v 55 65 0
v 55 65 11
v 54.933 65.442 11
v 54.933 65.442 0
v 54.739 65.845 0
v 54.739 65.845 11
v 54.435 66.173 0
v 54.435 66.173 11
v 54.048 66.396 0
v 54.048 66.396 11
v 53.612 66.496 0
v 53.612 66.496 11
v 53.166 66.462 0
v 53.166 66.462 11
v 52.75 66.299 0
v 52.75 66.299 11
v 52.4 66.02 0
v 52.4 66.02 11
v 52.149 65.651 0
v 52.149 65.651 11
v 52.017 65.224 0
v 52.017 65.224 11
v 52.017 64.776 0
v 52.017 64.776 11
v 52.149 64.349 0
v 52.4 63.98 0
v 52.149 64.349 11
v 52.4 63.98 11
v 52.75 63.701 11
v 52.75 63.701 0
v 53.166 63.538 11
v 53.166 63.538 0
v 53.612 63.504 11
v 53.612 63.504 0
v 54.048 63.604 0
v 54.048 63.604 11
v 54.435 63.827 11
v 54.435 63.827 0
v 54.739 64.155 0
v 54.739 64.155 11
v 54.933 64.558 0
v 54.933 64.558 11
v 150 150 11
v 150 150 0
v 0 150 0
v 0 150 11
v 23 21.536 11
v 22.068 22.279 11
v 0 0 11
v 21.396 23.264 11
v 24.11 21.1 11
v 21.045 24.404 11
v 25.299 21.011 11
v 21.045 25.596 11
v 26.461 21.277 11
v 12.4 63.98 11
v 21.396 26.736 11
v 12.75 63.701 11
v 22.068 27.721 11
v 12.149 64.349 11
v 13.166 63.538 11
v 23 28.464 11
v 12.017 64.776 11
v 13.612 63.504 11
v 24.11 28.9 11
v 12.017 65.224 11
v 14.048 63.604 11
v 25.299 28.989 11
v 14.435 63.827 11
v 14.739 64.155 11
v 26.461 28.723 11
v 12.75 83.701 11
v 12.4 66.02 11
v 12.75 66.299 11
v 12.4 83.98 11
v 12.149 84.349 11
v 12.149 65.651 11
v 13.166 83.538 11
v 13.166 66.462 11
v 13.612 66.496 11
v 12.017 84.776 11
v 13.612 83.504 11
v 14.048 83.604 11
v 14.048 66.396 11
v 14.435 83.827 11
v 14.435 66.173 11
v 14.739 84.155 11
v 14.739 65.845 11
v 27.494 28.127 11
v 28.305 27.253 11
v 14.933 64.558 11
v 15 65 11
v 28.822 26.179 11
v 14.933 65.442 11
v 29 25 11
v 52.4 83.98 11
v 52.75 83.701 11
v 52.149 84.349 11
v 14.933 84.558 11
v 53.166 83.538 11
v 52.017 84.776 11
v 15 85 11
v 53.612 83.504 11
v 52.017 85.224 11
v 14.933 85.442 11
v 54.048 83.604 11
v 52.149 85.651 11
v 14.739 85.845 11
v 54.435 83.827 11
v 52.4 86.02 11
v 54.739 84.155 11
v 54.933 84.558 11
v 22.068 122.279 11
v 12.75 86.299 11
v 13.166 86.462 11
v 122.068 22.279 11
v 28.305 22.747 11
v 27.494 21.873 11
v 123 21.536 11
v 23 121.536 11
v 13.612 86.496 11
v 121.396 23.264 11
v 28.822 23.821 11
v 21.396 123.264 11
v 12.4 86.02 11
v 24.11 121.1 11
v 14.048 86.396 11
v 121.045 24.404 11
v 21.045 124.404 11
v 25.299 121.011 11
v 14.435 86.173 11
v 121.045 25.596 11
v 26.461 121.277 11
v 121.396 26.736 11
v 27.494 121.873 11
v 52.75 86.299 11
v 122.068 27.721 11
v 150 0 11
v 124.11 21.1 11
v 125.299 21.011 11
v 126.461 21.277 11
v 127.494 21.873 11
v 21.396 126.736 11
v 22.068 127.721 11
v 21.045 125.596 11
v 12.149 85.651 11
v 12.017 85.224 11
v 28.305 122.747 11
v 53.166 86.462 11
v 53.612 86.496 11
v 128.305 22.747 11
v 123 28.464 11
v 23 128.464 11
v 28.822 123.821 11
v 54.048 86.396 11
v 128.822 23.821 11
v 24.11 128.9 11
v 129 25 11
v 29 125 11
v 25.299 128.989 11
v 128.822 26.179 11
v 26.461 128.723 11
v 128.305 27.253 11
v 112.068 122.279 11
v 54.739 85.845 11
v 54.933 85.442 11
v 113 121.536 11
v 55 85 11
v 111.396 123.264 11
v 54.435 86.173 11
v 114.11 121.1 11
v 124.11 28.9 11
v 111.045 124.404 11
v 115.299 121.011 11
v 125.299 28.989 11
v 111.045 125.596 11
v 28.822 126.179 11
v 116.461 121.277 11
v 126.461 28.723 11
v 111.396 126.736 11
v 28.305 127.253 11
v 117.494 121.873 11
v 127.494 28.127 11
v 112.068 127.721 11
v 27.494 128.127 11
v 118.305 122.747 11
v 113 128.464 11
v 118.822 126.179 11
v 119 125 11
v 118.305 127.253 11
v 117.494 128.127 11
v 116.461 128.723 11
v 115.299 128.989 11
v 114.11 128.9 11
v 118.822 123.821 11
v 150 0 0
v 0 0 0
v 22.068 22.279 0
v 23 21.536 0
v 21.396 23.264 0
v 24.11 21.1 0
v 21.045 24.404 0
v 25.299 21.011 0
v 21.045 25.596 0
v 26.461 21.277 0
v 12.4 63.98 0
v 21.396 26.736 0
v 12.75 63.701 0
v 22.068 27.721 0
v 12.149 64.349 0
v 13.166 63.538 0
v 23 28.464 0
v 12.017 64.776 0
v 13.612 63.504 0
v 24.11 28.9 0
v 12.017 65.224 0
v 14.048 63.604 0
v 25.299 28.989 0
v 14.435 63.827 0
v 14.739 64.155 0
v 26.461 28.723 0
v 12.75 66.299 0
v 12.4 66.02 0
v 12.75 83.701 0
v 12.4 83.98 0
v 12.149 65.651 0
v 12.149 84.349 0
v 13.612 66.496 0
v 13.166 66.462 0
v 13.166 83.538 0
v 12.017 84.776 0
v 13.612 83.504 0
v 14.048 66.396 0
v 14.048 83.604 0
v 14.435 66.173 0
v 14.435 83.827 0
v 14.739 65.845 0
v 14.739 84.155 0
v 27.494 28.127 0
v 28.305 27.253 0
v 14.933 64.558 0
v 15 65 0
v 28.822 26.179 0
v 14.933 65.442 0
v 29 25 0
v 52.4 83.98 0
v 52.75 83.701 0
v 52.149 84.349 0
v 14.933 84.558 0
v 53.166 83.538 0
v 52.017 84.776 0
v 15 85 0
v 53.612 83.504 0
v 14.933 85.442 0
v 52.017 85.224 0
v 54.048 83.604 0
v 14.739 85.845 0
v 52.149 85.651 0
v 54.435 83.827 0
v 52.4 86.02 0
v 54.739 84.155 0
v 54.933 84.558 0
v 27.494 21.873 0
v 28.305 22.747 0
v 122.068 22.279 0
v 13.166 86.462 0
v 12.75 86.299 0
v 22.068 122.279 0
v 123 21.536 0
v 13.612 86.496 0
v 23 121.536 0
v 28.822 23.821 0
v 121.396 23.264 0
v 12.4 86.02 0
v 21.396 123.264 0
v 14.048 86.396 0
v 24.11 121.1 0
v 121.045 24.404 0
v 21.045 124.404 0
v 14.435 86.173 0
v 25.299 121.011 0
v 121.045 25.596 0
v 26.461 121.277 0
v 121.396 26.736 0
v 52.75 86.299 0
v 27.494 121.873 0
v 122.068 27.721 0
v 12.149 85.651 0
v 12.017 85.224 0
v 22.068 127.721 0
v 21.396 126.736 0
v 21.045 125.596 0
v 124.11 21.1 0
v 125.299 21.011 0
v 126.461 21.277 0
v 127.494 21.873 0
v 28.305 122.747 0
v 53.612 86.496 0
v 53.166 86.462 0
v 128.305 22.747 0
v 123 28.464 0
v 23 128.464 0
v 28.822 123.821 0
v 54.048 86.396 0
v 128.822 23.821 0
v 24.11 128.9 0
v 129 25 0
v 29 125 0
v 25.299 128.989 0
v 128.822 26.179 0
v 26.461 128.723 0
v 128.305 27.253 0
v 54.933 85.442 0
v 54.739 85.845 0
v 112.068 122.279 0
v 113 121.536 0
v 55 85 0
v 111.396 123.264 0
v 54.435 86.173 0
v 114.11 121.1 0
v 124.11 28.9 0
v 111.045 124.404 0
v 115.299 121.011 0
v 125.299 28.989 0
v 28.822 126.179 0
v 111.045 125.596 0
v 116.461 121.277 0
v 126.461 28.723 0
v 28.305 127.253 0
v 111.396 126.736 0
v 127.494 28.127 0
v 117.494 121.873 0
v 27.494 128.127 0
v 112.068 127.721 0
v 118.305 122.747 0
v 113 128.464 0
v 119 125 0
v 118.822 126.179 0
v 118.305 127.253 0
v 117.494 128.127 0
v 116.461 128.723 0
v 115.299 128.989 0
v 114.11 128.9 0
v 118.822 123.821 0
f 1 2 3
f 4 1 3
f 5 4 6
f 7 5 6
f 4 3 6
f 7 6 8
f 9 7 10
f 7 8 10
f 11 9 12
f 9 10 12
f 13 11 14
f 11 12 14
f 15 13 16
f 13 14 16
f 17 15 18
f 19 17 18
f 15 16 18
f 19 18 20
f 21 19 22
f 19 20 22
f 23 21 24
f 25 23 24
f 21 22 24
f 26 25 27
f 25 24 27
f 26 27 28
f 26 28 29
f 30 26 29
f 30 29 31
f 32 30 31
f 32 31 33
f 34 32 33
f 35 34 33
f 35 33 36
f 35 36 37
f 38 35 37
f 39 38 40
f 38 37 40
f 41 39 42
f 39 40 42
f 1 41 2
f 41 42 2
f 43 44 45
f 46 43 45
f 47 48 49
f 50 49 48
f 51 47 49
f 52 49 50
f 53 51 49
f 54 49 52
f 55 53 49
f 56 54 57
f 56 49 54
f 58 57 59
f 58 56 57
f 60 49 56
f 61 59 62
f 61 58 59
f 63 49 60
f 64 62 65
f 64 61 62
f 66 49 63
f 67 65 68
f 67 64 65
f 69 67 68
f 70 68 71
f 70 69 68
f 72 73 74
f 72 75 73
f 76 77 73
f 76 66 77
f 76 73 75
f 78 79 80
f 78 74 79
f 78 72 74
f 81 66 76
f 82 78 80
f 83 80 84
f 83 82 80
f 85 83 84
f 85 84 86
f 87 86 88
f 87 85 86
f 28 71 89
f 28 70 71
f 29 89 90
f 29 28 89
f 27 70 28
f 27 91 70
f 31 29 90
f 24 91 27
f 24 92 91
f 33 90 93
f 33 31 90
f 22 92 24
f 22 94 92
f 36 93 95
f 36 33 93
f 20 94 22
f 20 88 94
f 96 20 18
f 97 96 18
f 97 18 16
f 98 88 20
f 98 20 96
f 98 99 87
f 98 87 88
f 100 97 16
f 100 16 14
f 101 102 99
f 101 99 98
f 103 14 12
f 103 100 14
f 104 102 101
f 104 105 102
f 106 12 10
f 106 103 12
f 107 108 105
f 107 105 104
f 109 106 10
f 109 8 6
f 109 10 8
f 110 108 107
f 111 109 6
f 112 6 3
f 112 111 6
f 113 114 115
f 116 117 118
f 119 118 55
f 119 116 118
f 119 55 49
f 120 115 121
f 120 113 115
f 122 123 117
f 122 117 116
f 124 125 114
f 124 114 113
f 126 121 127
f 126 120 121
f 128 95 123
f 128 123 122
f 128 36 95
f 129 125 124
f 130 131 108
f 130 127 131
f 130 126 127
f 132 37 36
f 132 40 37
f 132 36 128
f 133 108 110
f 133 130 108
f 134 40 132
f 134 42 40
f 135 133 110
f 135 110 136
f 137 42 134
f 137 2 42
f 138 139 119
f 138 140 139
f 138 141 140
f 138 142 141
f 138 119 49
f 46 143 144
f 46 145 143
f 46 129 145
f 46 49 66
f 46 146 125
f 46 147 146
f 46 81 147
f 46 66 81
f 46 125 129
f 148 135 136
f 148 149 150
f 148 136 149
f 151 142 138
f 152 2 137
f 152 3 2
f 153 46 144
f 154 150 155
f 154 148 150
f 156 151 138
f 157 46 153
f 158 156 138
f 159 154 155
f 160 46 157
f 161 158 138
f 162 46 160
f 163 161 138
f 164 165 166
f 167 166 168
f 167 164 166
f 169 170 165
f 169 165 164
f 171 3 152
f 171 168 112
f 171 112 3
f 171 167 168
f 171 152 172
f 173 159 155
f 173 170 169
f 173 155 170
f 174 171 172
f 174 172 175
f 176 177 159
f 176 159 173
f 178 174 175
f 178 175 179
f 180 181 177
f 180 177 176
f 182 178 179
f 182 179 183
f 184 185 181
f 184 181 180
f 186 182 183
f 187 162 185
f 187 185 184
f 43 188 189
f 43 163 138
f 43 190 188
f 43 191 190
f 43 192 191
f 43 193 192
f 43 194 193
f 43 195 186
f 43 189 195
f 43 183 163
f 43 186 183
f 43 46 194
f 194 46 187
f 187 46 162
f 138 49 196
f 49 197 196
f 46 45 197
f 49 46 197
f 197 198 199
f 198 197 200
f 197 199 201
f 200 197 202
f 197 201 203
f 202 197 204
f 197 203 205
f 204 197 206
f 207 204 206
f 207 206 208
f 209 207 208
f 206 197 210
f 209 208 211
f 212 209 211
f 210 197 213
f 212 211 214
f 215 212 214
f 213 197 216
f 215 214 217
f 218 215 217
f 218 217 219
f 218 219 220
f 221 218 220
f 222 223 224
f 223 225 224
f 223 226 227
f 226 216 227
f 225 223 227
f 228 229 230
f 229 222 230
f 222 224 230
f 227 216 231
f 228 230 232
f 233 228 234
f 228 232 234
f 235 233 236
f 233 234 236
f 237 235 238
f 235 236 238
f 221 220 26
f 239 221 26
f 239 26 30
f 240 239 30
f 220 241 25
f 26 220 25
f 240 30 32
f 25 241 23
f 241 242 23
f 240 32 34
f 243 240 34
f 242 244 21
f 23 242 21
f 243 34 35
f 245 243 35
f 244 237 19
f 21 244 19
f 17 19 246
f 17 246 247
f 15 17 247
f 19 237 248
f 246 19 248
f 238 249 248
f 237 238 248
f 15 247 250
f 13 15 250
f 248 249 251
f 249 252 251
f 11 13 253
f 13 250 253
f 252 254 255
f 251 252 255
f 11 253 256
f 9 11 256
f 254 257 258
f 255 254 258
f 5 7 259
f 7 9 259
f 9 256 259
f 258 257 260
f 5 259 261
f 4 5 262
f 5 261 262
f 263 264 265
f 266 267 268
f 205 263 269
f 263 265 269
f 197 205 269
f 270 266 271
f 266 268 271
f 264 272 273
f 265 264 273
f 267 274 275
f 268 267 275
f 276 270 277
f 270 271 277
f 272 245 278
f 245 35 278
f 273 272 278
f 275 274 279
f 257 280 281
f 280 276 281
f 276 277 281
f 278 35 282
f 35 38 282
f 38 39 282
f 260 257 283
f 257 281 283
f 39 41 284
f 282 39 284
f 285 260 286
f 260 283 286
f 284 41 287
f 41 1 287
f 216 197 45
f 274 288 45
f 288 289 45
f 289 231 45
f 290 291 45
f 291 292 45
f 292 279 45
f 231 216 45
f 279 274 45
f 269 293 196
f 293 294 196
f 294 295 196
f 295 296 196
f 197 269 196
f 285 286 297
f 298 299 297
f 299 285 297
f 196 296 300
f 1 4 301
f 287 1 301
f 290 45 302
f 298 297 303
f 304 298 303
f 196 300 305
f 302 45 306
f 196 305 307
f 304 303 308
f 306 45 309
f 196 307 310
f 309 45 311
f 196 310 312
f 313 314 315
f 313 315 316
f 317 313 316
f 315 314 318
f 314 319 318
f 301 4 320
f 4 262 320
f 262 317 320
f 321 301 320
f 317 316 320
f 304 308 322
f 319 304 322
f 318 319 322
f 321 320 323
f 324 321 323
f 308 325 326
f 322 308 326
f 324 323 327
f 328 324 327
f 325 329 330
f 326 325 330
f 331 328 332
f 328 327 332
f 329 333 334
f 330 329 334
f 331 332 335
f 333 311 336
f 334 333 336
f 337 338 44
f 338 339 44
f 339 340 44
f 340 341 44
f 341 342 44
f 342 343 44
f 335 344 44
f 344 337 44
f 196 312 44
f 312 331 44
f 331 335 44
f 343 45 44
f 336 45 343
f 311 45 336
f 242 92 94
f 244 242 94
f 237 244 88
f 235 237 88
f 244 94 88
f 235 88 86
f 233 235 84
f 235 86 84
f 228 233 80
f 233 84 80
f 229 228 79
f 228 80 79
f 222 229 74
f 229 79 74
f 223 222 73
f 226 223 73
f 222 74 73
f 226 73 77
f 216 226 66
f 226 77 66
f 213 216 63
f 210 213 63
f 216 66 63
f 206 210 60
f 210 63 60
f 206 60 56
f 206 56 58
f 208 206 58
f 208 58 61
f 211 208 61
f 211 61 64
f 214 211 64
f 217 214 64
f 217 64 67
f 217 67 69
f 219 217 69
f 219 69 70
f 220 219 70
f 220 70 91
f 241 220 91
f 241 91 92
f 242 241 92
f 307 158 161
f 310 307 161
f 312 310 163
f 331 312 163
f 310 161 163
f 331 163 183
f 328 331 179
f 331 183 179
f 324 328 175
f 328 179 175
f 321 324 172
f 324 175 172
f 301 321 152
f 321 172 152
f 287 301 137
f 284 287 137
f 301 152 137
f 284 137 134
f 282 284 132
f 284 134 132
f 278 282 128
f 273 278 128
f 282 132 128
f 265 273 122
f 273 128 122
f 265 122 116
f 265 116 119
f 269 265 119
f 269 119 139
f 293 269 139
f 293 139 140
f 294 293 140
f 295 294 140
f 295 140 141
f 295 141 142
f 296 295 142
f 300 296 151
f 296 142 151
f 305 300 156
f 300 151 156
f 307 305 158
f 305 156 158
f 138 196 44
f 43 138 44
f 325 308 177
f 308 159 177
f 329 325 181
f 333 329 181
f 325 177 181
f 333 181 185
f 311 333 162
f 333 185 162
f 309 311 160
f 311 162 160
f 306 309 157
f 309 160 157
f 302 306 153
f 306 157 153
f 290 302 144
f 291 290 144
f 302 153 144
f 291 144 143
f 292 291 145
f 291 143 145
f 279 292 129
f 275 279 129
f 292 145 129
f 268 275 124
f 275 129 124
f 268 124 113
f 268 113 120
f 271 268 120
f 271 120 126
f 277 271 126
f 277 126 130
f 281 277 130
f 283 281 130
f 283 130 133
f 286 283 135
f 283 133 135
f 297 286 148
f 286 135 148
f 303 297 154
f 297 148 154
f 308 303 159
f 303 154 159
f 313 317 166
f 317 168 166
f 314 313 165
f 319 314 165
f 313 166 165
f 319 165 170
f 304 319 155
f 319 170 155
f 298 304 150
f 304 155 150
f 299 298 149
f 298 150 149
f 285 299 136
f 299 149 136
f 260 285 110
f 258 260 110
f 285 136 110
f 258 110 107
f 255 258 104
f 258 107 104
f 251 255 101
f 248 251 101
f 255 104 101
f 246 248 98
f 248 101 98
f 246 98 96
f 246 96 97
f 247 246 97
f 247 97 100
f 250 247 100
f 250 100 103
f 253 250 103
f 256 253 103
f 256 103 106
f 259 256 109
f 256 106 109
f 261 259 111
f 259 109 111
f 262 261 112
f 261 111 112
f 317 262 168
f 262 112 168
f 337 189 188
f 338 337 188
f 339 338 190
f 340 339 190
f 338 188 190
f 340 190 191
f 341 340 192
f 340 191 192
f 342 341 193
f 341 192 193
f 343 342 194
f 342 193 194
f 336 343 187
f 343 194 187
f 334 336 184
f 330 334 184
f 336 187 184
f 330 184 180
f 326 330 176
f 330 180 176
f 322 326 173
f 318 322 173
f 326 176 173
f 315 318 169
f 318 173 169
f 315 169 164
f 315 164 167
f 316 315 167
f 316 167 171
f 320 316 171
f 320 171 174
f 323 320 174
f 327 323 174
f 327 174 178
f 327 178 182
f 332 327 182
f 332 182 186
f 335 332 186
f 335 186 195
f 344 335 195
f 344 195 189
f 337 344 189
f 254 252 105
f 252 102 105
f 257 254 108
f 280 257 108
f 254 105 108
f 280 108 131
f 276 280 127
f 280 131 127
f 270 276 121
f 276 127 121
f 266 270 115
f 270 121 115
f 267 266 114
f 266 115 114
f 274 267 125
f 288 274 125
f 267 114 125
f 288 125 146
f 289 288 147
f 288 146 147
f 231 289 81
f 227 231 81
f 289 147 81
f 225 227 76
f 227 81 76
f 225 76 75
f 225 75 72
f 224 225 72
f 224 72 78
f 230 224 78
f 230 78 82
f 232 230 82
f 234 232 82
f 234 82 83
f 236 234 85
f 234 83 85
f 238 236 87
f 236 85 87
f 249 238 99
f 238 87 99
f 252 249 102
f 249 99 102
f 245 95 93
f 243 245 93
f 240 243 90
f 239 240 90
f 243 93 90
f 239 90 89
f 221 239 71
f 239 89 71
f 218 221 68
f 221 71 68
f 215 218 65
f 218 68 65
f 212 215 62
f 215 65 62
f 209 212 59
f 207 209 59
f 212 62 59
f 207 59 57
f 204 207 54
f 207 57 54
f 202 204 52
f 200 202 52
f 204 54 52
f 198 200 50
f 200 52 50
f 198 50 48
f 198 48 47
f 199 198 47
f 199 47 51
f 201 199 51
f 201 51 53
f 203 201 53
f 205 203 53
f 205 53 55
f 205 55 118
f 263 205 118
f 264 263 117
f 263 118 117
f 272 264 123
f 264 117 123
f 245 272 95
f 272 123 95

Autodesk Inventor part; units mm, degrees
ref_plane "YZ Plane" through (0, 0, 0) normal (1, 0, 0) x (0, 1, 0)
ref_plane "XZ Plane" through (0, 0, 0) normal (0, 1, 0) x (-1, 0, 0)
ref_plane "XY Plane" through (0, 0, 0) normal (0, 0, 1) x (1, 0, 0)
sketch "Sketch1" plane through (0, 0, 0) normal (0, 0, 1) x (1, 0, 0)
  line L0 (0, 0) -> (150, 0)
  line L1 (150, 0) -> (150, 150)
  line L2 (150, 150) -> (0, 150)
  line L3 (0, 150) -> (0, 0)
  dimension "d0" = 150
  dimension "d1" = 150
extrude "Extrusion1" add sketch "Sketch1" along normal blind 11
sketch "Sketch2" plane through (0, 0, 11) normal (0, 0, 1) x (1, 0, 0)
  circle A0 centre (13.5, 85) radius 1.5
  circle A1 centre (13.5, 65) radius 1.5
  circle A2 centre (53.5, 85) radius 1.5
  circle A3 centre (53.5, 65) radius 1.5
  line L0 (0, 150) -> (0, 0) projected
  line L1 (0, 0) -> (150, 0) projected
  line L2 (150, 150) -> (0, 150) projected
  line L3 (75, 150) -> (75, 0)
  line L4 (-23.1394, 75) -> (177.6706, 75)
  dimension "d4" = 3
  dimension "d5" = 3
  dimension "d6" = 20
  dimension "d7" = 3
  dimension "d8" = 3
  dimension "d10" = 40
  dimension "d11" = 40
  dimension "d12" = 20
  dimension "d13" = 13.5
  dimension "d14" = 13.5
  dimension "d15" = 65
  dimension "d16" = 65
extrude "Extrusion2" cut sketch "Sketch2" against normal blind 11 contours A0 | A1 | A2 | A3
sketch "Sketch3" plane through (0, 0, 11) normal (0, 0, 1) x (1, 0, 0)
  circle A0 centre (25, 25) radius 4
  circle A1 centre (25, 125) radius 4
  circle A2 centre (125, 25) radius 4
  circle A3 centre (115, 125) radius 4
  line L0 (150, 0) -> (150, 150) projected
  line L1 (150, 150) -> (0, 150) projected
  line L2 (0, 0) -> (150, 0) projected
  line L3 (0, 150) -> (0, 0) projected
  dimension "d19" = 8
  dimension "d20" = 8
  dimension "d21" = 8
  dimension "d22" = 8
  dimension "d23" = 35
  dimension "d24" = 25
  dimension "d25" = 25
  dimension "d26" = 25
  dimension "d27" = 25
  dimension "d28" = 25
  dimension "d29" = 25
  dimension "d30" = 25
extrude "Extrusion3" cut sketch "Sketch3" against normal blind 11 contours A0 | A1 | A2 | A3
properties part number "Teste bloco do motor"
